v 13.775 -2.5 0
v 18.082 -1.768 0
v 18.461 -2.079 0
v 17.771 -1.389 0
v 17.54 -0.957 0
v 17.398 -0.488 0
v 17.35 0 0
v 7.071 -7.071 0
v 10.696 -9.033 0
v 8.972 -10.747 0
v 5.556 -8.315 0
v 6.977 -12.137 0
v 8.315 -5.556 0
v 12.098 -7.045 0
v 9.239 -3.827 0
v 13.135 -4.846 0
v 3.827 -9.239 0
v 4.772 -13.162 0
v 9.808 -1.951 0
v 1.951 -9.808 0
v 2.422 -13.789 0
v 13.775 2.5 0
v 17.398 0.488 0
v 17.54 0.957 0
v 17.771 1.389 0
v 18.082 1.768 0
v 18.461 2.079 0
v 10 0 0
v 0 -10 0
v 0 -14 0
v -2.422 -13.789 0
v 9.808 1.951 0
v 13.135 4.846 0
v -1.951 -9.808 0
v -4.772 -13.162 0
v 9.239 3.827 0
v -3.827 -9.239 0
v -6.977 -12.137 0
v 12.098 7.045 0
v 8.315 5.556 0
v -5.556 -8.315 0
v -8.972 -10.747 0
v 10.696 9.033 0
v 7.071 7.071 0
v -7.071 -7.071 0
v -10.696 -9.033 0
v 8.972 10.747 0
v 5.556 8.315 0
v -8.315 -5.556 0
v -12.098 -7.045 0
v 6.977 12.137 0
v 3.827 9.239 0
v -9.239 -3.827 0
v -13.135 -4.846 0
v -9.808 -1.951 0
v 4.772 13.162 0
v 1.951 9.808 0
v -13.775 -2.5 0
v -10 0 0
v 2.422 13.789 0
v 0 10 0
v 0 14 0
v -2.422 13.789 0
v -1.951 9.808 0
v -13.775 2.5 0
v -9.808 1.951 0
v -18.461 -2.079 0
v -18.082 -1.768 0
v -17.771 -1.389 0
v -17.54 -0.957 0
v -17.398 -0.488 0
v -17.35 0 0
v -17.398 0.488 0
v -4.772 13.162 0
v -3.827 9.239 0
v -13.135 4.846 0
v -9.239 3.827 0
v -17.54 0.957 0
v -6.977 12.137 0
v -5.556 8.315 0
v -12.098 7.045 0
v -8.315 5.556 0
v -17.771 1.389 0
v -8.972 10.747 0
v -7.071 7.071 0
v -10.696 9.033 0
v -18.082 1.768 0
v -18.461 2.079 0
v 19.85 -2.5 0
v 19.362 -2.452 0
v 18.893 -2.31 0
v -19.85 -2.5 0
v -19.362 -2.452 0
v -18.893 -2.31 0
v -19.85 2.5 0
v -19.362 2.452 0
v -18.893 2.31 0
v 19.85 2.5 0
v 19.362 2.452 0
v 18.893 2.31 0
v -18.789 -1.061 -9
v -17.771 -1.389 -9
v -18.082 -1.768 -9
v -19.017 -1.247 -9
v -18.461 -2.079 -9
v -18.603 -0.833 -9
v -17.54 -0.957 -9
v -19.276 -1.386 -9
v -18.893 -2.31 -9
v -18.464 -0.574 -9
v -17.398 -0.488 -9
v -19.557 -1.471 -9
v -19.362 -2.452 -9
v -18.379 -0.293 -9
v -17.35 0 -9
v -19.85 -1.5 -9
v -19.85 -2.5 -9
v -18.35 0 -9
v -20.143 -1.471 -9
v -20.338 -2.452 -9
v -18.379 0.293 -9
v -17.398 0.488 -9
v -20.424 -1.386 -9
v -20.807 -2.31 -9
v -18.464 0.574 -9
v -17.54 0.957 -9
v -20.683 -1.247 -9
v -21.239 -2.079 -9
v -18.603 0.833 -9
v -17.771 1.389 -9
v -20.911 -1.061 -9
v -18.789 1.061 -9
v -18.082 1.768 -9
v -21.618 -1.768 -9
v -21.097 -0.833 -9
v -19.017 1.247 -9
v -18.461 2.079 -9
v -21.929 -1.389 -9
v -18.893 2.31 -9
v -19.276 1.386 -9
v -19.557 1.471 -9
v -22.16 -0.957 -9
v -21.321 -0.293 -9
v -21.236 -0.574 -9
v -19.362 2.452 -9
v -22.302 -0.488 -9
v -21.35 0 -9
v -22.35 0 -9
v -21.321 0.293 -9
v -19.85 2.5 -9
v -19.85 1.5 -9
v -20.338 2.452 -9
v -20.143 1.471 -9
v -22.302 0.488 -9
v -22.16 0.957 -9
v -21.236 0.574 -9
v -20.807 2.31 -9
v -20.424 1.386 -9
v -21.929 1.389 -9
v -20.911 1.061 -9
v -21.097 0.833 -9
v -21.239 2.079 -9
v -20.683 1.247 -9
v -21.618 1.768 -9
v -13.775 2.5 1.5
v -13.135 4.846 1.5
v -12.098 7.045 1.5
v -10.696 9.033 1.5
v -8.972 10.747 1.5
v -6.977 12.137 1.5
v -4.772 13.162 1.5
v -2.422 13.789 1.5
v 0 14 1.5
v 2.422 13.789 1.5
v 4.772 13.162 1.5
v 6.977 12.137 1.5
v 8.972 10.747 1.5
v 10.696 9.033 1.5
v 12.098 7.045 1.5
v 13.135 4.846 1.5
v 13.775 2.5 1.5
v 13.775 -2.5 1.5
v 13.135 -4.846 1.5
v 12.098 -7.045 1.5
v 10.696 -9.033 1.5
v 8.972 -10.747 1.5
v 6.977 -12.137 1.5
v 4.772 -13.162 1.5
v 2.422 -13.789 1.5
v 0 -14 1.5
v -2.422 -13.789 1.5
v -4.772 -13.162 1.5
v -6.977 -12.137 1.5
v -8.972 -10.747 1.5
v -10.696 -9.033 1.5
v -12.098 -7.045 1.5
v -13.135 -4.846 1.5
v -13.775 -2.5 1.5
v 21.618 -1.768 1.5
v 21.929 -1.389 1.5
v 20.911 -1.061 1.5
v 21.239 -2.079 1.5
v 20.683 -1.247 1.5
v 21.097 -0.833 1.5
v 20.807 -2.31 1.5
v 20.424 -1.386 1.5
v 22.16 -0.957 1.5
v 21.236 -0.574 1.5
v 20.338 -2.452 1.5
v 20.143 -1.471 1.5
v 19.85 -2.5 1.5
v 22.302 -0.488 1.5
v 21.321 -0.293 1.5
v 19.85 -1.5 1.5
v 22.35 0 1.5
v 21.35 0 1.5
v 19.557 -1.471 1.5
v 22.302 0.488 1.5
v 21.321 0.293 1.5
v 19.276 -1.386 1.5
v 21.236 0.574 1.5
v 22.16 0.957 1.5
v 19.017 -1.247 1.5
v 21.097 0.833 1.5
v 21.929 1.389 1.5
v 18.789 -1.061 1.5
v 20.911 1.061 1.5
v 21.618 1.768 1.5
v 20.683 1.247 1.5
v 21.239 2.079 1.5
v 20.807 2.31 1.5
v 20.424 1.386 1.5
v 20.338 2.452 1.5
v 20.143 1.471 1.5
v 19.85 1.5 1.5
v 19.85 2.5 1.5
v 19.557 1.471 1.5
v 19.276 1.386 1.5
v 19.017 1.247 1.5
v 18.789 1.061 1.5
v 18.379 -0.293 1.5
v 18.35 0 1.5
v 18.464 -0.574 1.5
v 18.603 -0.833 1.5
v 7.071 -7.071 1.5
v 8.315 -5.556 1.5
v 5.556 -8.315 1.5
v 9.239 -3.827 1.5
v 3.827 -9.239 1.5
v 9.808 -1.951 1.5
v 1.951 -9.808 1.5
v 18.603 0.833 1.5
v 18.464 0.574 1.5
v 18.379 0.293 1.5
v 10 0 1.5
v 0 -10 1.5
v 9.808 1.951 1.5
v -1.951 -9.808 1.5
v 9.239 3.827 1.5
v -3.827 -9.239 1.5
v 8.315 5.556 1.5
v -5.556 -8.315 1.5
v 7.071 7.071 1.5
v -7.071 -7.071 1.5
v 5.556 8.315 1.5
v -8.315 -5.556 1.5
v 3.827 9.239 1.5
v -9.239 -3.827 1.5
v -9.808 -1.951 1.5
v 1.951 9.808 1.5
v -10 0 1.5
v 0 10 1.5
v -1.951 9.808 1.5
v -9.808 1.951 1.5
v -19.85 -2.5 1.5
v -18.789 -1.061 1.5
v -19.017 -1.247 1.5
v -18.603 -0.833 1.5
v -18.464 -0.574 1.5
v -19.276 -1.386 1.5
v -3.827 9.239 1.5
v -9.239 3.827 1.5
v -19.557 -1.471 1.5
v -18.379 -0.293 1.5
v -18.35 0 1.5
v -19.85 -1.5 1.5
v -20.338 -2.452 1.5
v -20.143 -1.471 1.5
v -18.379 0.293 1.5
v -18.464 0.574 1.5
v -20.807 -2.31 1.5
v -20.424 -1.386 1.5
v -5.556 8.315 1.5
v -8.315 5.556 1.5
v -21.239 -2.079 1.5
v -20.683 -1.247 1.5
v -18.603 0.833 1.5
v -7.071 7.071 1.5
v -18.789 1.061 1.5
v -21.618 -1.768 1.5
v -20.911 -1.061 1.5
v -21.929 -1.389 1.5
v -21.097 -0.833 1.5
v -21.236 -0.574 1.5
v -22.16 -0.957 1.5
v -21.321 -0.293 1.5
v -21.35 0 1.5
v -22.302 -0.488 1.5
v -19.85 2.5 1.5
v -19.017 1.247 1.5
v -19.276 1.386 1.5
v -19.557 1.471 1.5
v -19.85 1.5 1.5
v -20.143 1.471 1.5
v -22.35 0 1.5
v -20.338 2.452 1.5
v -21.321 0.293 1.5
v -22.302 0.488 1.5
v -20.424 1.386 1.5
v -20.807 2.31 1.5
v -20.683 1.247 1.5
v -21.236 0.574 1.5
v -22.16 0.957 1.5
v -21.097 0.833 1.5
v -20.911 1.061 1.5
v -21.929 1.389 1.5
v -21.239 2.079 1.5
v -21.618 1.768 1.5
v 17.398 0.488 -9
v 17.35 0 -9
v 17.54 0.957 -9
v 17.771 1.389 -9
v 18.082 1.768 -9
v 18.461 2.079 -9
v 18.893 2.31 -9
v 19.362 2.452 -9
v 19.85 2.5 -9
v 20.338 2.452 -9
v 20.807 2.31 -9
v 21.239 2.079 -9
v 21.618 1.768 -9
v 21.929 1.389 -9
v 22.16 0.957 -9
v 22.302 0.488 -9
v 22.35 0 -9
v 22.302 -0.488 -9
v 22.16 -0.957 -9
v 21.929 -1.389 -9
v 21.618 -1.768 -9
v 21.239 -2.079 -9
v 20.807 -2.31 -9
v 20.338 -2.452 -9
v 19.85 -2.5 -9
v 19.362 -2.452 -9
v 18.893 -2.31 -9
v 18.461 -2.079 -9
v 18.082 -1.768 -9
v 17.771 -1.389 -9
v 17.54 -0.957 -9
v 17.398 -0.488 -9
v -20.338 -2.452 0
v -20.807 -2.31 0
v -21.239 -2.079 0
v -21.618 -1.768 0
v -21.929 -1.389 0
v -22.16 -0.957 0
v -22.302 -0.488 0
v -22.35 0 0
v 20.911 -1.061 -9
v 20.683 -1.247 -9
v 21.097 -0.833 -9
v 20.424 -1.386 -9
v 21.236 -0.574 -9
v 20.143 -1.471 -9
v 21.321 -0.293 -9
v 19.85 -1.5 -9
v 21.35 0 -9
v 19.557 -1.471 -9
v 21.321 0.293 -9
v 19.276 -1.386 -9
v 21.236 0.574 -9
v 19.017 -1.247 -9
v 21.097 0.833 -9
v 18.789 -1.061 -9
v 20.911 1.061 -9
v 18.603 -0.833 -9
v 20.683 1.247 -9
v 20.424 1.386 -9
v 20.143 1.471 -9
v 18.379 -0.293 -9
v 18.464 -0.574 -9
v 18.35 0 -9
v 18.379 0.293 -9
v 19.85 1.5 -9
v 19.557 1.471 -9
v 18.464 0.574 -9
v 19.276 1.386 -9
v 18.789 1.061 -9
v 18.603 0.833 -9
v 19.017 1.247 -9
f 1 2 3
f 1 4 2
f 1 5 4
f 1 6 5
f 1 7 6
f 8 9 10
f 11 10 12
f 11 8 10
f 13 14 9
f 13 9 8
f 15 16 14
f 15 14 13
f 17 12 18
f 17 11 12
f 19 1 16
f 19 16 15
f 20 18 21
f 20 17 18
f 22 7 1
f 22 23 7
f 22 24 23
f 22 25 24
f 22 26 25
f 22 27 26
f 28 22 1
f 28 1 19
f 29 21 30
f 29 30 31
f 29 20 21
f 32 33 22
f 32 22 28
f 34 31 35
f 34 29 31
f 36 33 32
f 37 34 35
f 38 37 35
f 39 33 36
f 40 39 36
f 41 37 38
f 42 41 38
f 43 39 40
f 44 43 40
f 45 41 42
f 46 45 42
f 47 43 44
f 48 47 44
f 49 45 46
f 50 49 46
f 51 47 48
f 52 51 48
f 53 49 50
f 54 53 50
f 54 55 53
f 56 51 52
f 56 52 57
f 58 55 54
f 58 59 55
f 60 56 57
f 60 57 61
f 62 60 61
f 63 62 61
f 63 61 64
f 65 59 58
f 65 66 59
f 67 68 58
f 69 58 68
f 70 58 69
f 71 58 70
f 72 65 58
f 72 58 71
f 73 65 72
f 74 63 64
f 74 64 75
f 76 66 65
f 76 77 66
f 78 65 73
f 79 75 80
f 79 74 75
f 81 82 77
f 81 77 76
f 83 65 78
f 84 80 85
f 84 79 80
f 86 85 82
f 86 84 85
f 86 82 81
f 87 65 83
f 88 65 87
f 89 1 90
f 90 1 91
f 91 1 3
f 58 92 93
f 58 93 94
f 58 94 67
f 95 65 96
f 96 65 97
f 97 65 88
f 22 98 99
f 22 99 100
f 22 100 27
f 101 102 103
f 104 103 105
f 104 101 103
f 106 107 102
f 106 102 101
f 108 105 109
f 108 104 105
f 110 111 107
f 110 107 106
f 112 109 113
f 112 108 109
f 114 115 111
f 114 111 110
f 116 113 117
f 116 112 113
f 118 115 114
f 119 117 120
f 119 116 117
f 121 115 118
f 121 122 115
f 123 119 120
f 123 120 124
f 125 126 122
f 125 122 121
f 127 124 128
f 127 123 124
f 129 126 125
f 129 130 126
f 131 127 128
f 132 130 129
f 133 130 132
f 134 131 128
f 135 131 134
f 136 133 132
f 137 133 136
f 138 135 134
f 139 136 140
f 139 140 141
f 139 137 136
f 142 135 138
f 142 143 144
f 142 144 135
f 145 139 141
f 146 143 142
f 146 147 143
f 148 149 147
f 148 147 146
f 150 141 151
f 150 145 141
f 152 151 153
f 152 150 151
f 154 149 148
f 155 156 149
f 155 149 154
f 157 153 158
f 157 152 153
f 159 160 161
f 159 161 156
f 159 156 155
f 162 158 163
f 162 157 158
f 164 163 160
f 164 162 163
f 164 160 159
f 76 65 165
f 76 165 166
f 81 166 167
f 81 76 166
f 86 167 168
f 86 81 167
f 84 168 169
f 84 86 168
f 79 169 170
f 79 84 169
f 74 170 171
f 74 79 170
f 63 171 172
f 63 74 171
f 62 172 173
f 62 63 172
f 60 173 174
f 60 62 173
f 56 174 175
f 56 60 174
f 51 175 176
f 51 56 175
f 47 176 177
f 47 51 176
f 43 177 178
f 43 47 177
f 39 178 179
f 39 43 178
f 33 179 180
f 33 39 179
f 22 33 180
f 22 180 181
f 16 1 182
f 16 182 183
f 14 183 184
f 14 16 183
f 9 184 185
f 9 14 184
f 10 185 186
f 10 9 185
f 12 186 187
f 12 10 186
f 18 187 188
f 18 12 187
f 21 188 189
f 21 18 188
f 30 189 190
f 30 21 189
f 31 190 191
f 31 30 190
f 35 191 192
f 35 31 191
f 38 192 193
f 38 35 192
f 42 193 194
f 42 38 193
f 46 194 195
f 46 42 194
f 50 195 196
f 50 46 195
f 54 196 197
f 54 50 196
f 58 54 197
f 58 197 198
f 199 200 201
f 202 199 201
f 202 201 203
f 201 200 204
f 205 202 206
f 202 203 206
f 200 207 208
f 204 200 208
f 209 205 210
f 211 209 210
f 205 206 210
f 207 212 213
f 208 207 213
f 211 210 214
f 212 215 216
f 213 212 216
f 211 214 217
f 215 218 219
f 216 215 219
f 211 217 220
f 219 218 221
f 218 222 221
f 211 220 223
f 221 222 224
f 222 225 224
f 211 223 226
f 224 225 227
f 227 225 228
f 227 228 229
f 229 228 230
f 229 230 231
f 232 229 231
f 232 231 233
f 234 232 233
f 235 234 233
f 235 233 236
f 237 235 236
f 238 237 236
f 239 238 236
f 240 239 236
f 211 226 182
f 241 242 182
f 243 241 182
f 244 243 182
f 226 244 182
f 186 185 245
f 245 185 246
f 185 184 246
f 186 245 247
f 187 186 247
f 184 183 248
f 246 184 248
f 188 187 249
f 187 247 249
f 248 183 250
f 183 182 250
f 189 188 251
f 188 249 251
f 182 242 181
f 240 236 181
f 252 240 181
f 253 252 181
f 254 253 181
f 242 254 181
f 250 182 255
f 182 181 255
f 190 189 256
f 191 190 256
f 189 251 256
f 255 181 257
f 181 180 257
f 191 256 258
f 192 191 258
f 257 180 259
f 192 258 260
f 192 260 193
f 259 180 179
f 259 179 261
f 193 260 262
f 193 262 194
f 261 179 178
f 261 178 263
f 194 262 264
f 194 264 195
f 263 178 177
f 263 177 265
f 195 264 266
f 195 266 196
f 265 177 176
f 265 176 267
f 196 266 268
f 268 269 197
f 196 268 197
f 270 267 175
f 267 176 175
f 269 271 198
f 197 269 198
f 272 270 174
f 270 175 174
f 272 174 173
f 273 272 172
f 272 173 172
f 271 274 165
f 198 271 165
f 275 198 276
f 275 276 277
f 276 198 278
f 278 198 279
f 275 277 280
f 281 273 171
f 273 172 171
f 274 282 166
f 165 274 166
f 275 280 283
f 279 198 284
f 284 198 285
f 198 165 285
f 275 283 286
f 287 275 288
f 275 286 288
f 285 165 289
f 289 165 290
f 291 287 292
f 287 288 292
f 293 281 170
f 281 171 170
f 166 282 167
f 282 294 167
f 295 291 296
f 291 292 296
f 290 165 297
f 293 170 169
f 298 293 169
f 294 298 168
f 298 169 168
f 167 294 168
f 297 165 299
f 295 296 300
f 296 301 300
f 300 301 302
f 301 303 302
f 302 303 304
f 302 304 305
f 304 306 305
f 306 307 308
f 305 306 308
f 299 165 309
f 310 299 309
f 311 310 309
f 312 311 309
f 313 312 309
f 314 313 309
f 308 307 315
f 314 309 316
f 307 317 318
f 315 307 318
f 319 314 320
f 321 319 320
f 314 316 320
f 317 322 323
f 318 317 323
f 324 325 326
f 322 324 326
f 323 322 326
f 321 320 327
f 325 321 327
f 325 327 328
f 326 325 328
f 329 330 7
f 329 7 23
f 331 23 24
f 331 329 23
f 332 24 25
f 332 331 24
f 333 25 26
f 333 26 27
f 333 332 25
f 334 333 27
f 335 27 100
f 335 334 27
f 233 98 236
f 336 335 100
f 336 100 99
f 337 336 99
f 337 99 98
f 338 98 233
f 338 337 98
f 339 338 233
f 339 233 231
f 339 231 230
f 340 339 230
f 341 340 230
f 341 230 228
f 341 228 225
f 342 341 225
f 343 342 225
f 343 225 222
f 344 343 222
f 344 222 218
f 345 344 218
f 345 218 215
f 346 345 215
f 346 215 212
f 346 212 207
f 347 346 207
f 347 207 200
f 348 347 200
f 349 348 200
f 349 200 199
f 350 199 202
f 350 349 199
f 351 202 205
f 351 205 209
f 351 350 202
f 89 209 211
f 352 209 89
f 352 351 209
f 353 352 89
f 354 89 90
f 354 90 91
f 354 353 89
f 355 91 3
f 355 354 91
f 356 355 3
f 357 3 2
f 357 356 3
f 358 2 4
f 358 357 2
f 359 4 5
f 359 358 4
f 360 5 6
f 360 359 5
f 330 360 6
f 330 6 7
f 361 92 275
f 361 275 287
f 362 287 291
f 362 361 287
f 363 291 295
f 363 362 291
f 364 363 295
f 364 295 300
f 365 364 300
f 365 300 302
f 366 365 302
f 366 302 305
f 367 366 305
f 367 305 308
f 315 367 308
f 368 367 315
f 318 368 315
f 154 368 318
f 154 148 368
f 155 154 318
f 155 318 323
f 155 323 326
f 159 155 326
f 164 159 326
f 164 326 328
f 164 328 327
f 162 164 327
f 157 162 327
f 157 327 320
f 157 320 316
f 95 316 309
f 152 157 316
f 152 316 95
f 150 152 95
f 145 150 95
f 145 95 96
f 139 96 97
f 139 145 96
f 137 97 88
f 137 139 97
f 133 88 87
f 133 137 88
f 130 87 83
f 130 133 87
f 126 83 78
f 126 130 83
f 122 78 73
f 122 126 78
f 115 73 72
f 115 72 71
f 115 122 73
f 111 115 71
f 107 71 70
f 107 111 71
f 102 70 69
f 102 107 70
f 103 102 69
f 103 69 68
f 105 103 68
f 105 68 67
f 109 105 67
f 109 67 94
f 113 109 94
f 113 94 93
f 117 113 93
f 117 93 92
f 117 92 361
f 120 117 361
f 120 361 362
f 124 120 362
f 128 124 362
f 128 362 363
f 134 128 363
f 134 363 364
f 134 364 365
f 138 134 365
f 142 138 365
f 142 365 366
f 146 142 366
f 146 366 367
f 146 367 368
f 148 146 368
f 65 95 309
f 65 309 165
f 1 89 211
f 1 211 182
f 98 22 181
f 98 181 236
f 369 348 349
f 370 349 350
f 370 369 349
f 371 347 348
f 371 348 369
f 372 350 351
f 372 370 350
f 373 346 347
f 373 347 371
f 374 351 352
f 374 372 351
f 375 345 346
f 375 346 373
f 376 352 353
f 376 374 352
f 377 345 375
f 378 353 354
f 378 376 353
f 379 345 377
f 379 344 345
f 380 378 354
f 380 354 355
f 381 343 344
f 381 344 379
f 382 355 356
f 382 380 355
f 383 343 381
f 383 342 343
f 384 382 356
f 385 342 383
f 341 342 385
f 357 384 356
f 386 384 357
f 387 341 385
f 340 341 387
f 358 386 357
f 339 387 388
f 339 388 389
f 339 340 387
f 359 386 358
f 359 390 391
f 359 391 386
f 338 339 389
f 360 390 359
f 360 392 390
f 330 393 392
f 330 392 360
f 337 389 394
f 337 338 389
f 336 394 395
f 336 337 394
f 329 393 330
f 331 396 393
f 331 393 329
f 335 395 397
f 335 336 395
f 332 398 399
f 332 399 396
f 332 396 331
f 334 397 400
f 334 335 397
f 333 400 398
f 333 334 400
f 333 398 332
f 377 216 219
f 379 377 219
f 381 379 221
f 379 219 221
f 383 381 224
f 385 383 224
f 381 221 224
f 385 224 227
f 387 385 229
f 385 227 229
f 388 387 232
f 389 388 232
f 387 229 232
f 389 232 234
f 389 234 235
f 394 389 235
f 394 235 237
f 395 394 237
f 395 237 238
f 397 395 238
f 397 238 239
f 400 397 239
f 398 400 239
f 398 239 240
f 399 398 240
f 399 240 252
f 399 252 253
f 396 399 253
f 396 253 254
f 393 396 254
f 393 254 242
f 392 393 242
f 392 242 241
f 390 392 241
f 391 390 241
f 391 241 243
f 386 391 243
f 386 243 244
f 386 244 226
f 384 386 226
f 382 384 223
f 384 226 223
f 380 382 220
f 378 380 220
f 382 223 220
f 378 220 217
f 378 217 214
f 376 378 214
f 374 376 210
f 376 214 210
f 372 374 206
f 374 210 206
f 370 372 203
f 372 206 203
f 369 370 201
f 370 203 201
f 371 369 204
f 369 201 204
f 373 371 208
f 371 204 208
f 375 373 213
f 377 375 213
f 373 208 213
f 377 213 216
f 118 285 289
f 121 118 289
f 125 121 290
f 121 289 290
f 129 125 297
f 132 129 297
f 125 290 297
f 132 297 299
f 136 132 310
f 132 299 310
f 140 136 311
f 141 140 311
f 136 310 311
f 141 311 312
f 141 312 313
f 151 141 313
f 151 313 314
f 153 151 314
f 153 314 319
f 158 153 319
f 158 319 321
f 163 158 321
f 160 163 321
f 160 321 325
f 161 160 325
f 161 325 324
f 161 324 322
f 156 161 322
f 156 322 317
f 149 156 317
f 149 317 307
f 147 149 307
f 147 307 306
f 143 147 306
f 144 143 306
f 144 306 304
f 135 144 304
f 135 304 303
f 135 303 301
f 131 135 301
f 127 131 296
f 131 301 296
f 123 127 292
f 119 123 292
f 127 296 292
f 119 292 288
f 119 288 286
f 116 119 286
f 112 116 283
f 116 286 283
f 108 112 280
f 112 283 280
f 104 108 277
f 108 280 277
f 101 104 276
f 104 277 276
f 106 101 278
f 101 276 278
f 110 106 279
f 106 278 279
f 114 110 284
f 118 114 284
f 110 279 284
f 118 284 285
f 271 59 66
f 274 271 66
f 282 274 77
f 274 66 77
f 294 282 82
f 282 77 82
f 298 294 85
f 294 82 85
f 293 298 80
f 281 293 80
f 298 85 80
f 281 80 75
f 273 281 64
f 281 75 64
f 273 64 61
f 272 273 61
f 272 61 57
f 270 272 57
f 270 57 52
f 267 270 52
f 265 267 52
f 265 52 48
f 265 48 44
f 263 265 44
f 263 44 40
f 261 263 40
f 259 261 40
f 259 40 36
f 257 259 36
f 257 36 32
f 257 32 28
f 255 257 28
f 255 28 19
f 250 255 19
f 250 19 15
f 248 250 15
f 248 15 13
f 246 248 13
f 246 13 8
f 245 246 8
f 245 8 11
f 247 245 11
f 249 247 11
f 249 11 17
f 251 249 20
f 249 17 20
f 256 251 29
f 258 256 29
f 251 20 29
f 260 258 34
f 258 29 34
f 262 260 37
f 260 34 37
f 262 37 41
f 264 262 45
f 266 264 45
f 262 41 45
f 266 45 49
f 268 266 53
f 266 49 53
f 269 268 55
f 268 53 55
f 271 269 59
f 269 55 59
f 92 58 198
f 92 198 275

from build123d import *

# Parameters (mm, degrees)
RESSALTO_EXTRUS_O1_DEPTH         = 1.5
RESSALTO_EXTRUS_O2_START         = 22
ESBO_O2_R                        = 2.5
RESSALTO_EXTRUS_O2_DEPTH         = 22
RESSALTO_EXTRUS_O3_START         = 22
ESBO_O3_R                        = 2.5
RESSALTO_EXTRUS_O3_DEPTH         = 22
FURO_DE_DI_METRO_3_0_3_1_D       = 3
FURO_DE_DI_METRO_20_0_20_1_D     = 20
FURO_DE_DI_METRO_20_0_20_1_DEPTH = 23.5
ESBO_O8_R                        = 2.5
CORTE_EXTRUS_O1_DEPTH            = 13


with BuildPart() as part:
    # Esboço1 → Ressalto-extrusão1 (new body)
    with BuildSketch(Plane(origin=(0, 0, 0), x_dir=(-1, 0, 0), z_dir=(0, 0, -1))):
        with BuildLine():
            Line((13.774977314, -2.5), (19.85, -2.5))
            ThreePointArc((19.85, -2.5), (22.35, 0), (19.85, 2.5))
            Line((19.85, 2.5), (13.774977314, 2.5))
            ThreePointArc((13.774977314, 2.5), (0, 14), (-13.774977314, 2.5))
            Line((-13.774977314, 2.5), (-19.85, 2.5))
            ThreePointArc((-19.85, 2.5), (-22.35, 0), (-19.85, -2.5))
            Line((-19.85, -2.5), (-13.774977314, -2.5))
            ThreePointArc((-13.774977314, -2.5), (0, -14), (13.774977314, -2.5))
        make_face()
    extrude(amount=-RESSALTO_EXTRUS_O1_DEPTH)

    # Esboço2 → Ressalto-extrusão2 (add)
    with BuildSketch(Plane(origin=(0, 0, 0), x_dir=(-1, 0, 0), z_dir=(0, 0, -1)).offset(RESSALTO_EXTRUS_O2_START)):
        with Locations((-19.85, 0)):
            Circle(ESBO_O2_R)
    extrude(amount=-RESSALTO_EXTRUS_O2_DEPTH)

    # Esboço3 → Ressalto-extrusão3 (add)
    with BuildSketch(Plane(origin=(0, 0, 0), x_dir=(-1, 0, 0), z_dir=(0, 0, -1)).offset(RESSALTO_EXTRUS_O3_START)):
        with Locations((19.85, 0)):
            Circle(ESBO_O3_R)
    extrude(amount=-RESSALTO_EXTRUS_O3_DEPTH)

    # Furo de diâmetro Ø3.0 (3)1 (through all)
    with Locations(Plane(origin=(0, 0, -22), x_dir=(-1, 0, 0), z_dir=(0, 0, -1))):
        with Locations((-19.85, 0), (19.85, 0)):
            Hole(FURO_DE_DI_METRO_3_0_3_1_D / 2)

    # Furo de diâmetro Ø20.0 (20)1
    with Locations(Plane.XY.offset(1.5)):
        with Locations((0, 0)):
            Hole(FURO_DE_DI_METRO_20_0_20_1_D / 2, depth=FURO_DE_DI_METRO_20_0_20_1_DEPTH)

    # Esboço8 → Corte-extrusão1 (cut)
    with BuildSketch(Plane(origin=(0, 0, -22), x_dir=(-1, 0, 0), z_dir=(0, 0, -1))):
        with Locations((19.85, 0)):
            Circle(ESBO_O8_R)
        with Locations((-19.85, 0)):
            Circle(ESBO_O8_R)
    extrude(amount=-CORTE_EXTRUS_O1_DEPTH, mode=Mode.SUBTRACT)


solid = part.part
